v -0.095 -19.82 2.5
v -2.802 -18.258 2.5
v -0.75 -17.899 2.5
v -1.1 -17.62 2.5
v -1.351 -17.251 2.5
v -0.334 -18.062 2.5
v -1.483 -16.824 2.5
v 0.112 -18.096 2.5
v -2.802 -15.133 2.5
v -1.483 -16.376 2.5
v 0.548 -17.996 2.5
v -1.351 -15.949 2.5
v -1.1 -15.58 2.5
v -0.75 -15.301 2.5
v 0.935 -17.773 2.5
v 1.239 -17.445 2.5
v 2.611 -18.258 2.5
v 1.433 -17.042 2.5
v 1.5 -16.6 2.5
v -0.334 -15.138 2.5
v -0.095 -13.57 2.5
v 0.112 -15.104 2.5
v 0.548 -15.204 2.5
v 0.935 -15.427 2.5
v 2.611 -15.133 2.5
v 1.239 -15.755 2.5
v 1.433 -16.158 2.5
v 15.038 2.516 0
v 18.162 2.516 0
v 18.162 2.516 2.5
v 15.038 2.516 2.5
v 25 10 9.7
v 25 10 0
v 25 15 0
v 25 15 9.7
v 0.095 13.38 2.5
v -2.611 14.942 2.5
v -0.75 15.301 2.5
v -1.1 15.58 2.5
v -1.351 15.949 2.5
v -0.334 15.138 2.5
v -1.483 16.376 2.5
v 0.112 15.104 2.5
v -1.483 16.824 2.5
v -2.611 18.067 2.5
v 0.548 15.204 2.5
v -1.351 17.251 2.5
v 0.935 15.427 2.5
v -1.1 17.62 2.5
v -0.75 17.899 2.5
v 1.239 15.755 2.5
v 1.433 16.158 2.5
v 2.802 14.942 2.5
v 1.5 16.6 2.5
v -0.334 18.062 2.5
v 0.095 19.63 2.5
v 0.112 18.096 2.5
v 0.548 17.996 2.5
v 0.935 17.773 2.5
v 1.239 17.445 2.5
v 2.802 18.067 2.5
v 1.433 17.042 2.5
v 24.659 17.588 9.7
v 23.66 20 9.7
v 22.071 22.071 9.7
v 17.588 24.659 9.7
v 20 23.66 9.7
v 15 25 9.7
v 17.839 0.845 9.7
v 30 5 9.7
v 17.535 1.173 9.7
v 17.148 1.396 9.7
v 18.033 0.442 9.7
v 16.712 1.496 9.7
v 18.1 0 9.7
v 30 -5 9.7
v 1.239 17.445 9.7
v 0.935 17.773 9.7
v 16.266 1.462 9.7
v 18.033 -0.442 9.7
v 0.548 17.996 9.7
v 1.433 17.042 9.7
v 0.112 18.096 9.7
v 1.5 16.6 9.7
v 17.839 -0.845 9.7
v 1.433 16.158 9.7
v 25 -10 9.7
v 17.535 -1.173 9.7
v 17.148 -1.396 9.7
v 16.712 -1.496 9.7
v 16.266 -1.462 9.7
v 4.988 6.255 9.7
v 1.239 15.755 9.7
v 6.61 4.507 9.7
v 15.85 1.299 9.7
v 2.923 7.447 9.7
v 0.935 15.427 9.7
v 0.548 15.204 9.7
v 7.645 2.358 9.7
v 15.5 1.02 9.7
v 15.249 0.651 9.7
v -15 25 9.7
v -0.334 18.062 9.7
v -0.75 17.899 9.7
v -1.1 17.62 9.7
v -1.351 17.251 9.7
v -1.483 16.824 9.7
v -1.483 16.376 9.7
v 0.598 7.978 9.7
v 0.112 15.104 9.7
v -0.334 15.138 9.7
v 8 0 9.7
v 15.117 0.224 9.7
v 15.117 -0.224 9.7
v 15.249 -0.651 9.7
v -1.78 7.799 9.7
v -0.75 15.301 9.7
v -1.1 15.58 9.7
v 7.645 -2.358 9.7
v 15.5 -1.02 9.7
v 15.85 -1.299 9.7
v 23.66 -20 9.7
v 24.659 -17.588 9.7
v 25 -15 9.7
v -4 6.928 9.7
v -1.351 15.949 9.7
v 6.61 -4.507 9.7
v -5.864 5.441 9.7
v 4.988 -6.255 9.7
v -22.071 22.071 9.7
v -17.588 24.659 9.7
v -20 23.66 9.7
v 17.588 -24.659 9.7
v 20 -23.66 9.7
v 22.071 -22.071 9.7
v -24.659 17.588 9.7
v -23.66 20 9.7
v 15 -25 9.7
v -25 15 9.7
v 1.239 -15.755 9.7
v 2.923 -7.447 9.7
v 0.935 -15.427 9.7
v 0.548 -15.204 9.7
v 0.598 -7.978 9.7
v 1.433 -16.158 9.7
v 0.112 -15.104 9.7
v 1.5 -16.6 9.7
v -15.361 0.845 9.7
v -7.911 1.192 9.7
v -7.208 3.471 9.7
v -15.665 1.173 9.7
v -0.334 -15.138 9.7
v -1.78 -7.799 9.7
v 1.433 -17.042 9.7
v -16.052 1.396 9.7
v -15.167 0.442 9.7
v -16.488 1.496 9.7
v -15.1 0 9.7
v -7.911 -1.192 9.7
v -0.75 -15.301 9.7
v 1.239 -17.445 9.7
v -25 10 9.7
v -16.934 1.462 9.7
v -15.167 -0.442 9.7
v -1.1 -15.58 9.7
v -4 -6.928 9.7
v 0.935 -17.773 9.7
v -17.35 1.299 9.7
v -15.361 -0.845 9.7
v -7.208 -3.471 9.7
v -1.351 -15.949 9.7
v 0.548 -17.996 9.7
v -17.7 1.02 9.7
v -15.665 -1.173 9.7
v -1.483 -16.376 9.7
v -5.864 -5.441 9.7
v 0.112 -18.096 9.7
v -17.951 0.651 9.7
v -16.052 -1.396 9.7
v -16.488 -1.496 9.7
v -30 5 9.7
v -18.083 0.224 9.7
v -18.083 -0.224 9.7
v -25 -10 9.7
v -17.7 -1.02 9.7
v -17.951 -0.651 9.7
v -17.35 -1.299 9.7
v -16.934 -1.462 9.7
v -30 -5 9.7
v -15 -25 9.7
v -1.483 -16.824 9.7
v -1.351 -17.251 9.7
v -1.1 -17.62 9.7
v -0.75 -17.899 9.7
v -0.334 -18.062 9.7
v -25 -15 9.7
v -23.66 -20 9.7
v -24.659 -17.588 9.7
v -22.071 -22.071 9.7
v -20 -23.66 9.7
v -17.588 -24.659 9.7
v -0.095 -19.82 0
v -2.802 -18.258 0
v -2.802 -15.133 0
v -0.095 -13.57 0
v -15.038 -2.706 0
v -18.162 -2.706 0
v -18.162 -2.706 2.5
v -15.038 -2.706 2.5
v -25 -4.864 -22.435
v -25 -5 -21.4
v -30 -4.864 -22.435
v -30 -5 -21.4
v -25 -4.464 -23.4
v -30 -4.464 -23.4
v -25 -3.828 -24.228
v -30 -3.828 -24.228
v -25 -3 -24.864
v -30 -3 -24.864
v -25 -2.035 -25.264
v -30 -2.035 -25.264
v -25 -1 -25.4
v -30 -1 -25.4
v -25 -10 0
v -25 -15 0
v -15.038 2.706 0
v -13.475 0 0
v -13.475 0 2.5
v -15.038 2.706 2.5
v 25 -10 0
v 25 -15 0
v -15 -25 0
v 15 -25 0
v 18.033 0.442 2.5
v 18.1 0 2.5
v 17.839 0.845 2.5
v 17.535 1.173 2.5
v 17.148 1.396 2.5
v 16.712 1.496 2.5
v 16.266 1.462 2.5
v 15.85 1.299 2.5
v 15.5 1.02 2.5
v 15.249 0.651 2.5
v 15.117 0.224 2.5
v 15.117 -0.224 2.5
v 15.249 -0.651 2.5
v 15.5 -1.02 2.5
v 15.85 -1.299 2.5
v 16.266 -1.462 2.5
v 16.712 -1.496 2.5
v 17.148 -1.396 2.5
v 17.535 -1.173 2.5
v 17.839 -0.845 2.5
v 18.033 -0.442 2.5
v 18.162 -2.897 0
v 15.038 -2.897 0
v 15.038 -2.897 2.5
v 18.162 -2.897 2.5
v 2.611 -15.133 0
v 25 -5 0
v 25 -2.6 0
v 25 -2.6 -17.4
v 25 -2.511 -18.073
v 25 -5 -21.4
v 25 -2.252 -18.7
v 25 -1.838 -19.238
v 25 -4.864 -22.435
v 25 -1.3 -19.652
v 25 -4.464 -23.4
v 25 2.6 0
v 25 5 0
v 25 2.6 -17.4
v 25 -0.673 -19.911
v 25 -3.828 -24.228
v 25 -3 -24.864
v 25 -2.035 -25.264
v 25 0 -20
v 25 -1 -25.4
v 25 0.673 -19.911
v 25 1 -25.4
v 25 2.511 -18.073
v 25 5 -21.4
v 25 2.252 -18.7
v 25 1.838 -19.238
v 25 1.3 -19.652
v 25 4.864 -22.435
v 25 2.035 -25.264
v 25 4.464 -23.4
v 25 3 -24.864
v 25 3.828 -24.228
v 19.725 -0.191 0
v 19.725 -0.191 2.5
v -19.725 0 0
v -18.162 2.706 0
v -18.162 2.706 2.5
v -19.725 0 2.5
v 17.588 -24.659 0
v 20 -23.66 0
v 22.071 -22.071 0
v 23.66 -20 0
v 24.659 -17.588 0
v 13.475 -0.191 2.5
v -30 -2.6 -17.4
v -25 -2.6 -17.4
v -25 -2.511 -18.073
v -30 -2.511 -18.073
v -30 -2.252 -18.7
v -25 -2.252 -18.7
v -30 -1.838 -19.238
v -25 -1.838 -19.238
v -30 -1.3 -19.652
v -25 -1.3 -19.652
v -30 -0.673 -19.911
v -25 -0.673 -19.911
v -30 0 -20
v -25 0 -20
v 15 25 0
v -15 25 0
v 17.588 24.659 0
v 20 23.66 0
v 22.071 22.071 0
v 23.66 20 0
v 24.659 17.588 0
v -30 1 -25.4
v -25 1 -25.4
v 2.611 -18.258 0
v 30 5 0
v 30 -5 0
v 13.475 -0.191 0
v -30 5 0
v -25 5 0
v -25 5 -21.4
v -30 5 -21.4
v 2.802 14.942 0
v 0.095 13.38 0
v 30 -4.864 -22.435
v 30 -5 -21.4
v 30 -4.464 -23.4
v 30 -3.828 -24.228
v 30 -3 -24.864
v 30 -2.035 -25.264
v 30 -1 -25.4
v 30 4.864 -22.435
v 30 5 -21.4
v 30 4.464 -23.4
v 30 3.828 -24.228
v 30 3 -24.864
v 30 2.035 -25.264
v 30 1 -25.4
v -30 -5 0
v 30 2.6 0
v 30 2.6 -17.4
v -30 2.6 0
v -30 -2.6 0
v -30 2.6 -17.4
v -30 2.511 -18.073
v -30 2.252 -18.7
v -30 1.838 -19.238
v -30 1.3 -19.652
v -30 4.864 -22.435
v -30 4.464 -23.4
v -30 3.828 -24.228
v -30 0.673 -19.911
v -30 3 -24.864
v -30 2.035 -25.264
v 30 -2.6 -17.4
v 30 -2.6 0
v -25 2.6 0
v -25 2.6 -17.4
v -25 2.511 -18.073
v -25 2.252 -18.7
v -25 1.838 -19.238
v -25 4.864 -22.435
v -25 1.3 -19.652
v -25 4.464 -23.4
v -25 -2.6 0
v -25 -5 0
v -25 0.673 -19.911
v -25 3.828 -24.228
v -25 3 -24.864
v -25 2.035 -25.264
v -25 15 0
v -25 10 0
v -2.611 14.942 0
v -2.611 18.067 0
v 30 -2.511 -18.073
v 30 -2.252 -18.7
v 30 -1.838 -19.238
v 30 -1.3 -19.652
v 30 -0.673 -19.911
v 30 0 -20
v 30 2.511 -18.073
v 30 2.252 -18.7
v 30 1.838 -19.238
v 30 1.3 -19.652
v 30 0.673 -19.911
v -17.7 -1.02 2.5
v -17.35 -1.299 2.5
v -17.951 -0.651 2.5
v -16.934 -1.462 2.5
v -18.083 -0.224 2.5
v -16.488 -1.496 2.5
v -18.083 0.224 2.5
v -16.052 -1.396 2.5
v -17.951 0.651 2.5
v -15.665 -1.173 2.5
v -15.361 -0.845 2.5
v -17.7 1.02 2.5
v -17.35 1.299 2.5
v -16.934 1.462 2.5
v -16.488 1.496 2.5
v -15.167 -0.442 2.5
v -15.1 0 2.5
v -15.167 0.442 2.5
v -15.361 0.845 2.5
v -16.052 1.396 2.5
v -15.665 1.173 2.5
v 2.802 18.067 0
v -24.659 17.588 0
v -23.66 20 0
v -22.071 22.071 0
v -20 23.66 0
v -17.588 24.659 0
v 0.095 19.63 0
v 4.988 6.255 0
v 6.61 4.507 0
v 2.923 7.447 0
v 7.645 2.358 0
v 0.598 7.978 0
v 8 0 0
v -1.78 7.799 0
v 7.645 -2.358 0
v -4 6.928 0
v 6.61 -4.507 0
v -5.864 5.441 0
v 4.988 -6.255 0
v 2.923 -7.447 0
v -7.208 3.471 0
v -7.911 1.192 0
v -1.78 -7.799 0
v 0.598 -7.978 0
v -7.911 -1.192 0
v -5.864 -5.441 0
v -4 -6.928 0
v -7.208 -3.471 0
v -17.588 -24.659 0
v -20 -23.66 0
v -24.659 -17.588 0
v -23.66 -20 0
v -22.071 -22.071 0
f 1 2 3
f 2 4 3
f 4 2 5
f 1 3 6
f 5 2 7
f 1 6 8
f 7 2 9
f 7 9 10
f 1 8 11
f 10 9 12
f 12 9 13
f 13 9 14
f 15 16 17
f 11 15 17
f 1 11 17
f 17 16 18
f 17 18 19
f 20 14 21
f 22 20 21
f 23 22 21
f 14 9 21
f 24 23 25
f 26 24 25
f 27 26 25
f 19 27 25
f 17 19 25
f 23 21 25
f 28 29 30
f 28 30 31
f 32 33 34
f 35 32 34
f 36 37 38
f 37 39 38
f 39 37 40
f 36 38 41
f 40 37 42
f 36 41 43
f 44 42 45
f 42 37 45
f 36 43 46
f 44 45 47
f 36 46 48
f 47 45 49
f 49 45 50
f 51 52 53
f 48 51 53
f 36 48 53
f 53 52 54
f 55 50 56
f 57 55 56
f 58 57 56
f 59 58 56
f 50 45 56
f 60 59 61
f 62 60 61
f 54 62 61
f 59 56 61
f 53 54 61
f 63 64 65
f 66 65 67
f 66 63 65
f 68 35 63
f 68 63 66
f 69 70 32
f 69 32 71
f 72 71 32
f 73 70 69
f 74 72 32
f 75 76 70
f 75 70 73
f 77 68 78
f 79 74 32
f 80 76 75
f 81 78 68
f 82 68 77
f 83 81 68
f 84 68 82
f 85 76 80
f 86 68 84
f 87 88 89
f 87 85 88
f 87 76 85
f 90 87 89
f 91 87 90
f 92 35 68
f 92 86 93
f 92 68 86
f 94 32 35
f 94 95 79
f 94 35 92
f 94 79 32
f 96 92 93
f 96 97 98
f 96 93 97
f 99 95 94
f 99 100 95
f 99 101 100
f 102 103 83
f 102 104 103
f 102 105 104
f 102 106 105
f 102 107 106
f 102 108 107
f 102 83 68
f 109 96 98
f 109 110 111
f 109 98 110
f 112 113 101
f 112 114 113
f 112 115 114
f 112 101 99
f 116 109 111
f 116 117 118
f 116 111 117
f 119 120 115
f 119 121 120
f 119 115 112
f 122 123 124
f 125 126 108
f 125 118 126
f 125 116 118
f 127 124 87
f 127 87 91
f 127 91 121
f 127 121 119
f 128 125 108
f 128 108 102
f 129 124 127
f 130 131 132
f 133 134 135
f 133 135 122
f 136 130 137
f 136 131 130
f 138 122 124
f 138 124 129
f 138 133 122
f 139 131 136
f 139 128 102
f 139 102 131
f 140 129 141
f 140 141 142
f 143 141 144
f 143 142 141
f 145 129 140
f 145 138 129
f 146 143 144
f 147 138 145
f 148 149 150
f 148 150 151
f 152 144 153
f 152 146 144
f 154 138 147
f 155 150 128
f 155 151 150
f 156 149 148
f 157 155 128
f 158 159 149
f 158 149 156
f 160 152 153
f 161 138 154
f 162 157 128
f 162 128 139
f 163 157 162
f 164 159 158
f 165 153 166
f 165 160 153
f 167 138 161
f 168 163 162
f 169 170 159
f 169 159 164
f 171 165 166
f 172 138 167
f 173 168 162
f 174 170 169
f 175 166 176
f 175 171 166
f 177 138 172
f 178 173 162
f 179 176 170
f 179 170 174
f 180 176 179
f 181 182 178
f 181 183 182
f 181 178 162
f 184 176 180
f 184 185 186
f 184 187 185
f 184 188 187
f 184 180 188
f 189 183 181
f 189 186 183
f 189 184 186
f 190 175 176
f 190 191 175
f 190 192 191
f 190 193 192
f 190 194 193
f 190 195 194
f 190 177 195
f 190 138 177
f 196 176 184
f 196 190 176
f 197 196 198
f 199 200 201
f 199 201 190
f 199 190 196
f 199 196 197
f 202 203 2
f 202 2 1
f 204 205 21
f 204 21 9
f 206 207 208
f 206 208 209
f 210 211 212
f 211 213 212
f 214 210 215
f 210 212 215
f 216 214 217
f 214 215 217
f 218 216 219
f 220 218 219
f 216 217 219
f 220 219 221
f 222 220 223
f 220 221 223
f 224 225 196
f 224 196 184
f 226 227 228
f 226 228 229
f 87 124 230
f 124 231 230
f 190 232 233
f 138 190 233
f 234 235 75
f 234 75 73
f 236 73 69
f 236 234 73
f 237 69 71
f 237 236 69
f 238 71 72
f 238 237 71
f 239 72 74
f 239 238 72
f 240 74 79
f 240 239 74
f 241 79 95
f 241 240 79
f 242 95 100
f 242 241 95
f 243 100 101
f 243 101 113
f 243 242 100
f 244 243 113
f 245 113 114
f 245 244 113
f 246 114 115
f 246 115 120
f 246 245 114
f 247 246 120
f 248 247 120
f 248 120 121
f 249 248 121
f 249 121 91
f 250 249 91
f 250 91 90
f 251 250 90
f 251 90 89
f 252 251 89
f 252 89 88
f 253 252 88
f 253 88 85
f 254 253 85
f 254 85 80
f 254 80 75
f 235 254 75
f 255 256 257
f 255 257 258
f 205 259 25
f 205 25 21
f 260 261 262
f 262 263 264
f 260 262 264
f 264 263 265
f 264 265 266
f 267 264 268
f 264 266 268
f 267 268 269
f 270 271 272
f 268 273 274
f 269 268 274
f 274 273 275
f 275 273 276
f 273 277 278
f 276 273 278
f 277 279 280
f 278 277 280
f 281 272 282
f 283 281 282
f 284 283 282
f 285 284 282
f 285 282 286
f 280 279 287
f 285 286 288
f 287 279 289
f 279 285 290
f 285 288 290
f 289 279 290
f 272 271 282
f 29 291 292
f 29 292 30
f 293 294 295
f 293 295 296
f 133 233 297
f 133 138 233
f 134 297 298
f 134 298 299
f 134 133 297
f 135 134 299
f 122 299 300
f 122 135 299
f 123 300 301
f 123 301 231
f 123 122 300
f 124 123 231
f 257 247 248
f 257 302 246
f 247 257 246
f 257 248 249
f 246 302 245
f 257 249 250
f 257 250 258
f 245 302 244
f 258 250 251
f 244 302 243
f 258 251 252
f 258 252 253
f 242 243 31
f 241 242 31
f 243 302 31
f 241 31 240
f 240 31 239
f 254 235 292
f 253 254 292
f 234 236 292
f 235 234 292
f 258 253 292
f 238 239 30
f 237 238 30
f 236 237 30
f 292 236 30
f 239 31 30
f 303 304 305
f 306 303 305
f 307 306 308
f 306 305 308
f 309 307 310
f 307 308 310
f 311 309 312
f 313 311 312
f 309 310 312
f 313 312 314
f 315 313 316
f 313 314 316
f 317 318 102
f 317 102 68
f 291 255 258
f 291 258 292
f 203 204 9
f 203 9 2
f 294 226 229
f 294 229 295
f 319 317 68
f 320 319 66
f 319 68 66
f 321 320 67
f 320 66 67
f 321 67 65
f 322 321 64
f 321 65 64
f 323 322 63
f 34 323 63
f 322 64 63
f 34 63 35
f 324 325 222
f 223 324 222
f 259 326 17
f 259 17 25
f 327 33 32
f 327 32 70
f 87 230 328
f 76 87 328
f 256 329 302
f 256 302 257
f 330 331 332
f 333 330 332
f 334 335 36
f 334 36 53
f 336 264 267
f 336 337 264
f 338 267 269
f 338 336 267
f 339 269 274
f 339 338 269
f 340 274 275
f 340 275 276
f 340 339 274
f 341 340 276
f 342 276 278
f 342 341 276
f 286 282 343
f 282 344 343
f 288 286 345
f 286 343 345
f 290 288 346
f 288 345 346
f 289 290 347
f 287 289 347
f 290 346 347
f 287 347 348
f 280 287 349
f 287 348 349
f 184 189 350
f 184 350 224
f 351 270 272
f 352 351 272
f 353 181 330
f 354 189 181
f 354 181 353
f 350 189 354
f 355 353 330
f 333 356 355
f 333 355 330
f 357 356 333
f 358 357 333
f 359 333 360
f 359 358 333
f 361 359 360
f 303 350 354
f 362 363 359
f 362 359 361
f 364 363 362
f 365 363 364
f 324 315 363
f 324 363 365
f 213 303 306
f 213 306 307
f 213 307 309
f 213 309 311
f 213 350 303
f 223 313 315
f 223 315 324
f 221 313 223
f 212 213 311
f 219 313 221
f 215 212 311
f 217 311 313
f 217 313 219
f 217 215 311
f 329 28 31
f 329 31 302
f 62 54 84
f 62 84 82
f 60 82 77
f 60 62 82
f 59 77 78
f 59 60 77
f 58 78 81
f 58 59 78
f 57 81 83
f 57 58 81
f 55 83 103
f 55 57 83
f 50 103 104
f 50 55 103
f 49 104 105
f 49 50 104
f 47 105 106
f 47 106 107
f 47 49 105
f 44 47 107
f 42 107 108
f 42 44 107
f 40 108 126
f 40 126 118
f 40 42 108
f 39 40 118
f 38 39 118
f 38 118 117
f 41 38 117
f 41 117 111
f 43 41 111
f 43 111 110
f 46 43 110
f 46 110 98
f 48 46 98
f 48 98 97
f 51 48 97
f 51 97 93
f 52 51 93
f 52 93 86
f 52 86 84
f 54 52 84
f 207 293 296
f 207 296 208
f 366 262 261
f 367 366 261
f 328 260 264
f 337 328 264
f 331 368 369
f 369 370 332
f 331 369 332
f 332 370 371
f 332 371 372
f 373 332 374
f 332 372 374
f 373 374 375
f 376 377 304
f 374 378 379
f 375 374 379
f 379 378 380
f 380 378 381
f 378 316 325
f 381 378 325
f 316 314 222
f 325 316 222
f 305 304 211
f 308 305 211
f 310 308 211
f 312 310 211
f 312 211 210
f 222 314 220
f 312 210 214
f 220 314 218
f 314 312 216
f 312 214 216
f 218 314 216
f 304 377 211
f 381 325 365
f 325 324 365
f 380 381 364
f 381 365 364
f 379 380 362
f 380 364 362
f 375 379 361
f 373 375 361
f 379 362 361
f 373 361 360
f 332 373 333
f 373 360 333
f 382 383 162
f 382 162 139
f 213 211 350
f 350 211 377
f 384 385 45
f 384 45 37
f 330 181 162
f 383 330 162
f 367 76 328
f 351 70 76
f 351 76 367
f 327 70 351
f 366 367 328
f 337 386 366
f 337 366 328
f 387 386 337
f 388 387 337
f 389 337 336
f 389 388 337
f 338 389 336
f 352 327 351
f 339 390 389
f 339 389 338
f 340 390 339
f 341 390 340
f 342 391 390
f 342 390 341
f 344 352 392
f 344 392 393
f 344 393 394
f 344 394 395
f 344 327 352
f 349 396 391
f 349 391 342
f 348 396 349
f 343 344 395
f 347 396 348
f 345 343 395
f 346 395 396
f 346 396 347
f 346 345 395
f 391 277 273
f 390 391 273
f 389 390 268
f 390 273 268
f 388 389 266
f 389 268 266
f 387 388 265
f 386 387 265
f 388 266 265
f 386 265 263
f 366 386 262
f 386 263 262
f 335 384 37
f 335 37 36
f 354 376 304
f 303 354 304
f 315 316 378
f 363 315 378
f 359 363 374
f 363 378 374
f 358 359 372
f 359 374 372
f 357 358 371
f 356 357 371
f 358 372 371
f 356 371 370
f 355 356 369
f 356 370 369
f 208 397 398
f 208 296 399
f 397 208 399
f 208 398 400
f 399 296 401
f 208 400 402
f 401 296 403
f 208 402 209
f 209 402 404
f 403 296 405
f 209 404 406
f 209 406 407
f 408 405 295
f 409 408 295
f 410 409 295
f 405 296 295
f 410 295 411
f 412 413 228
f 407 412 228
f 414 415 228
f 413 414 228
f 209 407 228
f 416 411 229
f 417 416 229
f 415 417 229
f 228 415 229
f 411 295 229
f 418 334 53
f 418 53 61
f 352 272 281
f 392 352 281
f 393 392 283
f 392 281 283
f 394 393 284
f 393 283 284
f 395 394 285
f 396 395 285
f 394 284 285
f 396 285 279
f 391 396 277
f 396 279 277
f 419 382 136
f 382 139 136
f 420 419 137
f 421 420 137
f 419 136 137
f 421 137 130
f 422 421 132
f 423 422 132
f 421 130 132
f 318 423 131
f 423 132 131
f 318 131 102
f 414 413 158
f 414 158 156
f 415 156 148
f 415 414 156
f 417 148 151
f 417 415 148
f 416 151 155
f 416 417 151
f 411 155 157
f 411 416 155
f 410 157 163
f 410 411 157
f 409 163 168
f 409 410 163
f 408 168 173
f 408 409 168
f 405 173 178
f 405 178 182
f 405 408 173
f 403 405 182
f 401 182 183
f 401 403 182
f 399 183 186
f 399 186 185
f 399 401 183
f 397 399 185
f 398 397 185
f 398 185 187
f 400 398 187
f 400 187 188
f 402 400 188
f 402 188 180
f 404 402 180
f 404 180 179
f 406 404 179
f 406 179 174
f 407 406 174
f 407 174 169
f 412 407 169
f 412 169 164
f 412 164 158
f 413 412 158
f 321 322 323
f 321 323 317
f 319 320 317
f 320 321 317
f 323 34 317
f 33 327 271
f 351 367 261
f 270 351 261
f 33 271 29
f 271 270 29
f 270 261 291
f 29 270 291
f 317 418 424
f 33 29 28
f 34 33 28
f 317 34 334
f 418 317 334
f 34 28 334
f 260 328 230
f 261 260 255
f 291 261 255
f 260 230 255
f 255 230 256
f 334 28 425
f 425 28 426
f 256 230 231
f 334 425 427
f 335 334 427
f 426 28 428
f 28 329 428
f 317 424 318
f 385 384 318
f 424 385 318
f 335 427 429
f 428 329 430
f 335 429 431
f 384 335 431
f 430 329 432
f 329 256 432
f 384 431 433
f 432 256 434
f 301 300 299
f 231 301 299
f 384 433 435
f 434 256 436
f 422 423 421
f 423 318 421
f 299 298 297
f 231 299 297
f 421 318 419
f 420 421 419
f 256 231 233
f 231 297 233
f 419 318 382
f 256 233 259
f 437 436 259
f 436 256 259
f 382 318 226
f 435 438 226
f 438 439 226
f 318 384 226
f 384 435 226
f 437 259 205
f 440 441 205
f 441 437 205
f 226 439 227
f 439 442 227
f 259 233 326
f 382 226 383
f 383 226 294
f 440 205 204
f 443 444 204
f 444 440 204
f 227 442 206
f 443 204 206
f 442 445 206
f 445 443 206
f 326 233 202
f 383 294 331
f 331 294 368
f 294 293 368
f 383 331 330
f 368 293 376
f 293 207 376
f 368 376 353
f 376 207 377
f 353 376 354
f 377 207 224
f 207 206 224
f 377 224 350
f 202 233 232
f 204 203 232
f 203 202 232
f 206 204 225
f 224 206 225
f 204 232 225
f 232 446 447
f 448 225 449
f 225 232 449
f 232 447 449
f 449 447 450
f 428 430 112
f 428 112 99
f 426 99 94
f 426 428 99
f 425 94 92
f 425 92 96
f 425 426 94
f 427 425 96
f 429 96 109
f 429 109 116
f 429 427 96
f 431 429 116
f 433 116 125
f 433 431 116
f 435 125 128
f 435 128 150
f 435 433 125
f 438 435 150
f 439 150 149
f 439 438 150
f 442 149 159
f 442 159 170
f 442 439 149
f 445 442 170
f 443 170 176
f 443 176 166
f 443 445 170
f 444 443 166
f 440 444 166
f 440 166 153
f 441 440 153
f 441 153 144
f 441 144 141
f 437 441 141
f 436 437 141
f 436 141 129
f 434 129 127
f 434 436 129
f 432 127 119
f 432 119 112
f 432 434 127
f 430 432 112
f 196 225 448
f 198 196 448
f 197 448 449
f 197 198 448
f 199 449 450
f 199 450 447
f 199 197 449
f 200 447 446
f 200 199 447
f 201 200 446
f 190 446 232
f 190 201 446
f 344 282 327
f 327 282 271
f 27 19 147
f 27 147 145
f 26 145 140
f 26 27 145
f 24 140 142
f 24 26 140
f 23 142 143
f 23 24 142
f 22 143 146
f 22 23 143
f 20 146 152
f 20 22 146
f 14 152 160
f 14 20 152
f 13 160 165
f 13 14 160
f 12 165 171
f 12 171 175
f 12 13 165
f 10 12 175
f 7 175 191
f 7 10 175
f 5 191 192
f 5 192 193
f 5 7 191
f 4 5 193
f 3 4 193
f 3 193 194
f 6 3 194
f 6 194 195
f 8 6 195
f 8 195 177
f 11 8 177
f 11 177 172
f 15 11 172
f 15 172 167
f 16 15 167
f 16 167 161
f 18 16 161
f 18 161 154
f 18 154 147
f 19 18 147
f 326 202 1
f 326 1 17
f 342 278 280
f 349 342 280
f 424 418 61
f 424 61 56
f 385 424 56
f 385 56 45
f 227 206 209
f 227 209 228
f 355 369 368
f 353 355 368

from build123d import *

# Parameters (mm, degrees)
SKETCH1_W           = 50
SKETCH1_H           = 50
SKETCH1_R           = 8
SKETCH1_R_2         = 1.5
BOSS_EXTRUDE1_DEPTH = 9.7
FILLET2_R           = 10
BOSS_EXTRUDE3_DEPTH = 5
CIRPATTERN6_COUNT   = 2
CUT_EXTRUDE1_DEPTH  = 2.5
FILLET3_R           = 4
CHAMFER2_SIZE       = 5


with BuildPart() as part:
    # Sketch1 → Boss-Extrude1 (new body)
    with BuildSketch(Plane.XY):
        Rectangle(SKETCH1_W, SKETCH1_H)
        Circle(SKETCH1_R, mode=Mode.SUBTRACT)
        with Locations((16.6, 0)):
            Circle(SKETCH1_R_2, mode=Mode.SUBTRACT)
        with Locations((0, -16.6)):
            Circle(SKETCH1_R_2, mode=Mode.SUBTRACT)
        with Locations((-16.6, 0)):
            Circle(SKETCH1_R_2, mode=Mode.SUBTRACT)
        with Locations((0, 16.6)):
            Circle(SKETCH1_R_2, mode=Mode.SUBTRACT)
    extrude(amount=BOSS_EXTRUDE1_DEPTH)

    # Fillet2
    fillet2_edges = [part.edges().sort_by_distance(p)[0] for p in [
        (-25, -25, 4.85),
        (-25, 25, 4.85),
        (25, 25, 4.85),
        (25, -25, 4.85),
    ]]
    fillet(fillet2_edges, radius=FILLET2_R)

    # Sketch7 → Boss-Extrude3 (add)
    with BuildSketch(Plane(origin=(25, 0, 0), x_dir=(0, 0, -1), z_dir=(1, 0, 0))):
        with BuildLine():
            Line((25.4, 5), (0, 5))
            Line((0, 5), (0, 2.6))
            Line((0, 2.6), (17.4, 2.6))
            ThreePointArc((17.4, 2.6), (19.238477631, 1.838477631), (20, 0))
            ThreePointArc((20, 0), (19.238477631, -1.838477631), (17.4, -2.6))
            Line((17.4, -2.6), (0, -2.6))
            Line((0, -2.6), (0, -5))
            Line((0, -5), (25.4, -5))
            Line((25.4, -5), (25.4, 5))
        make_face()
        Polygon((0, 5), (-9.7, 5), (-9.7, -5), (0, -5), (0, -2.6), (0, 2.6), align=None)
    boss_extrude3 = extrude(amount=BOSS_EXTRUDE3_DEPTH)

    # CirPattern6: Boss-Extrude3 ×2 about axis
    cirpattern6_axis = Axis((0, 0, 0), (0, 0, 1))
    for i in range(1, CIRPATTERN6_COUNT):
        add(boss_extrude3.rotate(cirpattern6_axis, i * 360 / CIRPATTERN6_COUNT))

    # Sketch9 → Cut-Extrude1 (cut)
    with BuildSketch(Plane(origin=(0, 0, 0), x_dir=(-1, 0, 0), z_dir=(0, 0, -1))):
        Polygon((2.801592181, -15.132762794), (2.801592181, -18.257762794), (0.095262794, -19.820262794), (-2.611066592, -18.257762794), (-2.611066592, -15.132762794), (0.095262794, -13.570262794), align=None)
        Polygon((18.1625, -2.706329387), (15.0375, -2.706329387), (13.475, 0), (15.0375, 2.706329387), (18.1625, 2.706329387), (19.725, 0), align=None)
        Polygon((2.611066592, 14.942237206), (-0.095262794, 13.379737206), (-2.801592181, 14.942237206), (-2.801592181, 18.067237206), (-0.095262794, 19.629737206), (2.611066592, 18.067237206), align=None)
        Polygon((-13.475, -0.190525589), (-15.0375, -2.896854976), (-18.1625, -2.896854976), (-19.725, -0.190525589), (-18.1625, 2.515803798), (-15.0375, 2.515803798), align=None)
    extrude(amount=-CUT_EXTRUDE1_DEPTH, mode=Mode.SUBTRACT)

    # Fillet3
    fillet3_edges = [part.edges().sort_by_distance(p)[0] for p in [
        (27.5, -5, -25.4),
        (27.5, 5, -25.4),
        (-27.5, 5, -25.4),
        (-27.5, -5, -25.4),
    ]]
    fillet(fillet3_edges, radius=FILLET3_R)

    # Chamfer2
    # the kernel refuses this chamfer: 5 mm, written as the material it adds along each edge
    with BuildSketch(Plane(origin=(-25, 5, 0), x_dir=(-0.9996219169112968, -0.027495876610586147, 0), z_dir=(0, 0, 1)), Plane(origin=(25, 5, 0), x_dir=(-0.027495876610586317, 0.9996219169112968, 0), z_dir=(0, 0, 1))) as chamfer2_piece_1:
        Polygon((CHAMFER2_SIZE * 0.999621916911, -CHAMFER2_SIZE * 0.0274958766106), (-CHAMFER2_SIZE * 0.0274958766106, -CHAMFER2_SIZE * 0.999621916911), (0, 0), align=None)
    extrude(amount=9.7)
    with BuildSketch(Plane(origin=(-25, -5, 0), x_dir=(-0.9996219169112968, 0.02749587661058649, 0), z_dir=(0, 0, 1)), Plane(origin=(25, -5, 0), x_dir=(-0.027495876610586317, -0.9996219169112968, 0), z_dir=(0, 0, 1))) as chamfer2_piece_2:
        Polygon((CHAMFER2_SIZE * 0.999621916911, CHAMFER2_SIZE * 0.0274958766106), (-CHAMFER2_SIZE * 0.0274958766106, CHAMFER2_SIZE * 0.999621916911), (0, 0), align=None)
    extrude(amount=9.7)


solid = part.part
